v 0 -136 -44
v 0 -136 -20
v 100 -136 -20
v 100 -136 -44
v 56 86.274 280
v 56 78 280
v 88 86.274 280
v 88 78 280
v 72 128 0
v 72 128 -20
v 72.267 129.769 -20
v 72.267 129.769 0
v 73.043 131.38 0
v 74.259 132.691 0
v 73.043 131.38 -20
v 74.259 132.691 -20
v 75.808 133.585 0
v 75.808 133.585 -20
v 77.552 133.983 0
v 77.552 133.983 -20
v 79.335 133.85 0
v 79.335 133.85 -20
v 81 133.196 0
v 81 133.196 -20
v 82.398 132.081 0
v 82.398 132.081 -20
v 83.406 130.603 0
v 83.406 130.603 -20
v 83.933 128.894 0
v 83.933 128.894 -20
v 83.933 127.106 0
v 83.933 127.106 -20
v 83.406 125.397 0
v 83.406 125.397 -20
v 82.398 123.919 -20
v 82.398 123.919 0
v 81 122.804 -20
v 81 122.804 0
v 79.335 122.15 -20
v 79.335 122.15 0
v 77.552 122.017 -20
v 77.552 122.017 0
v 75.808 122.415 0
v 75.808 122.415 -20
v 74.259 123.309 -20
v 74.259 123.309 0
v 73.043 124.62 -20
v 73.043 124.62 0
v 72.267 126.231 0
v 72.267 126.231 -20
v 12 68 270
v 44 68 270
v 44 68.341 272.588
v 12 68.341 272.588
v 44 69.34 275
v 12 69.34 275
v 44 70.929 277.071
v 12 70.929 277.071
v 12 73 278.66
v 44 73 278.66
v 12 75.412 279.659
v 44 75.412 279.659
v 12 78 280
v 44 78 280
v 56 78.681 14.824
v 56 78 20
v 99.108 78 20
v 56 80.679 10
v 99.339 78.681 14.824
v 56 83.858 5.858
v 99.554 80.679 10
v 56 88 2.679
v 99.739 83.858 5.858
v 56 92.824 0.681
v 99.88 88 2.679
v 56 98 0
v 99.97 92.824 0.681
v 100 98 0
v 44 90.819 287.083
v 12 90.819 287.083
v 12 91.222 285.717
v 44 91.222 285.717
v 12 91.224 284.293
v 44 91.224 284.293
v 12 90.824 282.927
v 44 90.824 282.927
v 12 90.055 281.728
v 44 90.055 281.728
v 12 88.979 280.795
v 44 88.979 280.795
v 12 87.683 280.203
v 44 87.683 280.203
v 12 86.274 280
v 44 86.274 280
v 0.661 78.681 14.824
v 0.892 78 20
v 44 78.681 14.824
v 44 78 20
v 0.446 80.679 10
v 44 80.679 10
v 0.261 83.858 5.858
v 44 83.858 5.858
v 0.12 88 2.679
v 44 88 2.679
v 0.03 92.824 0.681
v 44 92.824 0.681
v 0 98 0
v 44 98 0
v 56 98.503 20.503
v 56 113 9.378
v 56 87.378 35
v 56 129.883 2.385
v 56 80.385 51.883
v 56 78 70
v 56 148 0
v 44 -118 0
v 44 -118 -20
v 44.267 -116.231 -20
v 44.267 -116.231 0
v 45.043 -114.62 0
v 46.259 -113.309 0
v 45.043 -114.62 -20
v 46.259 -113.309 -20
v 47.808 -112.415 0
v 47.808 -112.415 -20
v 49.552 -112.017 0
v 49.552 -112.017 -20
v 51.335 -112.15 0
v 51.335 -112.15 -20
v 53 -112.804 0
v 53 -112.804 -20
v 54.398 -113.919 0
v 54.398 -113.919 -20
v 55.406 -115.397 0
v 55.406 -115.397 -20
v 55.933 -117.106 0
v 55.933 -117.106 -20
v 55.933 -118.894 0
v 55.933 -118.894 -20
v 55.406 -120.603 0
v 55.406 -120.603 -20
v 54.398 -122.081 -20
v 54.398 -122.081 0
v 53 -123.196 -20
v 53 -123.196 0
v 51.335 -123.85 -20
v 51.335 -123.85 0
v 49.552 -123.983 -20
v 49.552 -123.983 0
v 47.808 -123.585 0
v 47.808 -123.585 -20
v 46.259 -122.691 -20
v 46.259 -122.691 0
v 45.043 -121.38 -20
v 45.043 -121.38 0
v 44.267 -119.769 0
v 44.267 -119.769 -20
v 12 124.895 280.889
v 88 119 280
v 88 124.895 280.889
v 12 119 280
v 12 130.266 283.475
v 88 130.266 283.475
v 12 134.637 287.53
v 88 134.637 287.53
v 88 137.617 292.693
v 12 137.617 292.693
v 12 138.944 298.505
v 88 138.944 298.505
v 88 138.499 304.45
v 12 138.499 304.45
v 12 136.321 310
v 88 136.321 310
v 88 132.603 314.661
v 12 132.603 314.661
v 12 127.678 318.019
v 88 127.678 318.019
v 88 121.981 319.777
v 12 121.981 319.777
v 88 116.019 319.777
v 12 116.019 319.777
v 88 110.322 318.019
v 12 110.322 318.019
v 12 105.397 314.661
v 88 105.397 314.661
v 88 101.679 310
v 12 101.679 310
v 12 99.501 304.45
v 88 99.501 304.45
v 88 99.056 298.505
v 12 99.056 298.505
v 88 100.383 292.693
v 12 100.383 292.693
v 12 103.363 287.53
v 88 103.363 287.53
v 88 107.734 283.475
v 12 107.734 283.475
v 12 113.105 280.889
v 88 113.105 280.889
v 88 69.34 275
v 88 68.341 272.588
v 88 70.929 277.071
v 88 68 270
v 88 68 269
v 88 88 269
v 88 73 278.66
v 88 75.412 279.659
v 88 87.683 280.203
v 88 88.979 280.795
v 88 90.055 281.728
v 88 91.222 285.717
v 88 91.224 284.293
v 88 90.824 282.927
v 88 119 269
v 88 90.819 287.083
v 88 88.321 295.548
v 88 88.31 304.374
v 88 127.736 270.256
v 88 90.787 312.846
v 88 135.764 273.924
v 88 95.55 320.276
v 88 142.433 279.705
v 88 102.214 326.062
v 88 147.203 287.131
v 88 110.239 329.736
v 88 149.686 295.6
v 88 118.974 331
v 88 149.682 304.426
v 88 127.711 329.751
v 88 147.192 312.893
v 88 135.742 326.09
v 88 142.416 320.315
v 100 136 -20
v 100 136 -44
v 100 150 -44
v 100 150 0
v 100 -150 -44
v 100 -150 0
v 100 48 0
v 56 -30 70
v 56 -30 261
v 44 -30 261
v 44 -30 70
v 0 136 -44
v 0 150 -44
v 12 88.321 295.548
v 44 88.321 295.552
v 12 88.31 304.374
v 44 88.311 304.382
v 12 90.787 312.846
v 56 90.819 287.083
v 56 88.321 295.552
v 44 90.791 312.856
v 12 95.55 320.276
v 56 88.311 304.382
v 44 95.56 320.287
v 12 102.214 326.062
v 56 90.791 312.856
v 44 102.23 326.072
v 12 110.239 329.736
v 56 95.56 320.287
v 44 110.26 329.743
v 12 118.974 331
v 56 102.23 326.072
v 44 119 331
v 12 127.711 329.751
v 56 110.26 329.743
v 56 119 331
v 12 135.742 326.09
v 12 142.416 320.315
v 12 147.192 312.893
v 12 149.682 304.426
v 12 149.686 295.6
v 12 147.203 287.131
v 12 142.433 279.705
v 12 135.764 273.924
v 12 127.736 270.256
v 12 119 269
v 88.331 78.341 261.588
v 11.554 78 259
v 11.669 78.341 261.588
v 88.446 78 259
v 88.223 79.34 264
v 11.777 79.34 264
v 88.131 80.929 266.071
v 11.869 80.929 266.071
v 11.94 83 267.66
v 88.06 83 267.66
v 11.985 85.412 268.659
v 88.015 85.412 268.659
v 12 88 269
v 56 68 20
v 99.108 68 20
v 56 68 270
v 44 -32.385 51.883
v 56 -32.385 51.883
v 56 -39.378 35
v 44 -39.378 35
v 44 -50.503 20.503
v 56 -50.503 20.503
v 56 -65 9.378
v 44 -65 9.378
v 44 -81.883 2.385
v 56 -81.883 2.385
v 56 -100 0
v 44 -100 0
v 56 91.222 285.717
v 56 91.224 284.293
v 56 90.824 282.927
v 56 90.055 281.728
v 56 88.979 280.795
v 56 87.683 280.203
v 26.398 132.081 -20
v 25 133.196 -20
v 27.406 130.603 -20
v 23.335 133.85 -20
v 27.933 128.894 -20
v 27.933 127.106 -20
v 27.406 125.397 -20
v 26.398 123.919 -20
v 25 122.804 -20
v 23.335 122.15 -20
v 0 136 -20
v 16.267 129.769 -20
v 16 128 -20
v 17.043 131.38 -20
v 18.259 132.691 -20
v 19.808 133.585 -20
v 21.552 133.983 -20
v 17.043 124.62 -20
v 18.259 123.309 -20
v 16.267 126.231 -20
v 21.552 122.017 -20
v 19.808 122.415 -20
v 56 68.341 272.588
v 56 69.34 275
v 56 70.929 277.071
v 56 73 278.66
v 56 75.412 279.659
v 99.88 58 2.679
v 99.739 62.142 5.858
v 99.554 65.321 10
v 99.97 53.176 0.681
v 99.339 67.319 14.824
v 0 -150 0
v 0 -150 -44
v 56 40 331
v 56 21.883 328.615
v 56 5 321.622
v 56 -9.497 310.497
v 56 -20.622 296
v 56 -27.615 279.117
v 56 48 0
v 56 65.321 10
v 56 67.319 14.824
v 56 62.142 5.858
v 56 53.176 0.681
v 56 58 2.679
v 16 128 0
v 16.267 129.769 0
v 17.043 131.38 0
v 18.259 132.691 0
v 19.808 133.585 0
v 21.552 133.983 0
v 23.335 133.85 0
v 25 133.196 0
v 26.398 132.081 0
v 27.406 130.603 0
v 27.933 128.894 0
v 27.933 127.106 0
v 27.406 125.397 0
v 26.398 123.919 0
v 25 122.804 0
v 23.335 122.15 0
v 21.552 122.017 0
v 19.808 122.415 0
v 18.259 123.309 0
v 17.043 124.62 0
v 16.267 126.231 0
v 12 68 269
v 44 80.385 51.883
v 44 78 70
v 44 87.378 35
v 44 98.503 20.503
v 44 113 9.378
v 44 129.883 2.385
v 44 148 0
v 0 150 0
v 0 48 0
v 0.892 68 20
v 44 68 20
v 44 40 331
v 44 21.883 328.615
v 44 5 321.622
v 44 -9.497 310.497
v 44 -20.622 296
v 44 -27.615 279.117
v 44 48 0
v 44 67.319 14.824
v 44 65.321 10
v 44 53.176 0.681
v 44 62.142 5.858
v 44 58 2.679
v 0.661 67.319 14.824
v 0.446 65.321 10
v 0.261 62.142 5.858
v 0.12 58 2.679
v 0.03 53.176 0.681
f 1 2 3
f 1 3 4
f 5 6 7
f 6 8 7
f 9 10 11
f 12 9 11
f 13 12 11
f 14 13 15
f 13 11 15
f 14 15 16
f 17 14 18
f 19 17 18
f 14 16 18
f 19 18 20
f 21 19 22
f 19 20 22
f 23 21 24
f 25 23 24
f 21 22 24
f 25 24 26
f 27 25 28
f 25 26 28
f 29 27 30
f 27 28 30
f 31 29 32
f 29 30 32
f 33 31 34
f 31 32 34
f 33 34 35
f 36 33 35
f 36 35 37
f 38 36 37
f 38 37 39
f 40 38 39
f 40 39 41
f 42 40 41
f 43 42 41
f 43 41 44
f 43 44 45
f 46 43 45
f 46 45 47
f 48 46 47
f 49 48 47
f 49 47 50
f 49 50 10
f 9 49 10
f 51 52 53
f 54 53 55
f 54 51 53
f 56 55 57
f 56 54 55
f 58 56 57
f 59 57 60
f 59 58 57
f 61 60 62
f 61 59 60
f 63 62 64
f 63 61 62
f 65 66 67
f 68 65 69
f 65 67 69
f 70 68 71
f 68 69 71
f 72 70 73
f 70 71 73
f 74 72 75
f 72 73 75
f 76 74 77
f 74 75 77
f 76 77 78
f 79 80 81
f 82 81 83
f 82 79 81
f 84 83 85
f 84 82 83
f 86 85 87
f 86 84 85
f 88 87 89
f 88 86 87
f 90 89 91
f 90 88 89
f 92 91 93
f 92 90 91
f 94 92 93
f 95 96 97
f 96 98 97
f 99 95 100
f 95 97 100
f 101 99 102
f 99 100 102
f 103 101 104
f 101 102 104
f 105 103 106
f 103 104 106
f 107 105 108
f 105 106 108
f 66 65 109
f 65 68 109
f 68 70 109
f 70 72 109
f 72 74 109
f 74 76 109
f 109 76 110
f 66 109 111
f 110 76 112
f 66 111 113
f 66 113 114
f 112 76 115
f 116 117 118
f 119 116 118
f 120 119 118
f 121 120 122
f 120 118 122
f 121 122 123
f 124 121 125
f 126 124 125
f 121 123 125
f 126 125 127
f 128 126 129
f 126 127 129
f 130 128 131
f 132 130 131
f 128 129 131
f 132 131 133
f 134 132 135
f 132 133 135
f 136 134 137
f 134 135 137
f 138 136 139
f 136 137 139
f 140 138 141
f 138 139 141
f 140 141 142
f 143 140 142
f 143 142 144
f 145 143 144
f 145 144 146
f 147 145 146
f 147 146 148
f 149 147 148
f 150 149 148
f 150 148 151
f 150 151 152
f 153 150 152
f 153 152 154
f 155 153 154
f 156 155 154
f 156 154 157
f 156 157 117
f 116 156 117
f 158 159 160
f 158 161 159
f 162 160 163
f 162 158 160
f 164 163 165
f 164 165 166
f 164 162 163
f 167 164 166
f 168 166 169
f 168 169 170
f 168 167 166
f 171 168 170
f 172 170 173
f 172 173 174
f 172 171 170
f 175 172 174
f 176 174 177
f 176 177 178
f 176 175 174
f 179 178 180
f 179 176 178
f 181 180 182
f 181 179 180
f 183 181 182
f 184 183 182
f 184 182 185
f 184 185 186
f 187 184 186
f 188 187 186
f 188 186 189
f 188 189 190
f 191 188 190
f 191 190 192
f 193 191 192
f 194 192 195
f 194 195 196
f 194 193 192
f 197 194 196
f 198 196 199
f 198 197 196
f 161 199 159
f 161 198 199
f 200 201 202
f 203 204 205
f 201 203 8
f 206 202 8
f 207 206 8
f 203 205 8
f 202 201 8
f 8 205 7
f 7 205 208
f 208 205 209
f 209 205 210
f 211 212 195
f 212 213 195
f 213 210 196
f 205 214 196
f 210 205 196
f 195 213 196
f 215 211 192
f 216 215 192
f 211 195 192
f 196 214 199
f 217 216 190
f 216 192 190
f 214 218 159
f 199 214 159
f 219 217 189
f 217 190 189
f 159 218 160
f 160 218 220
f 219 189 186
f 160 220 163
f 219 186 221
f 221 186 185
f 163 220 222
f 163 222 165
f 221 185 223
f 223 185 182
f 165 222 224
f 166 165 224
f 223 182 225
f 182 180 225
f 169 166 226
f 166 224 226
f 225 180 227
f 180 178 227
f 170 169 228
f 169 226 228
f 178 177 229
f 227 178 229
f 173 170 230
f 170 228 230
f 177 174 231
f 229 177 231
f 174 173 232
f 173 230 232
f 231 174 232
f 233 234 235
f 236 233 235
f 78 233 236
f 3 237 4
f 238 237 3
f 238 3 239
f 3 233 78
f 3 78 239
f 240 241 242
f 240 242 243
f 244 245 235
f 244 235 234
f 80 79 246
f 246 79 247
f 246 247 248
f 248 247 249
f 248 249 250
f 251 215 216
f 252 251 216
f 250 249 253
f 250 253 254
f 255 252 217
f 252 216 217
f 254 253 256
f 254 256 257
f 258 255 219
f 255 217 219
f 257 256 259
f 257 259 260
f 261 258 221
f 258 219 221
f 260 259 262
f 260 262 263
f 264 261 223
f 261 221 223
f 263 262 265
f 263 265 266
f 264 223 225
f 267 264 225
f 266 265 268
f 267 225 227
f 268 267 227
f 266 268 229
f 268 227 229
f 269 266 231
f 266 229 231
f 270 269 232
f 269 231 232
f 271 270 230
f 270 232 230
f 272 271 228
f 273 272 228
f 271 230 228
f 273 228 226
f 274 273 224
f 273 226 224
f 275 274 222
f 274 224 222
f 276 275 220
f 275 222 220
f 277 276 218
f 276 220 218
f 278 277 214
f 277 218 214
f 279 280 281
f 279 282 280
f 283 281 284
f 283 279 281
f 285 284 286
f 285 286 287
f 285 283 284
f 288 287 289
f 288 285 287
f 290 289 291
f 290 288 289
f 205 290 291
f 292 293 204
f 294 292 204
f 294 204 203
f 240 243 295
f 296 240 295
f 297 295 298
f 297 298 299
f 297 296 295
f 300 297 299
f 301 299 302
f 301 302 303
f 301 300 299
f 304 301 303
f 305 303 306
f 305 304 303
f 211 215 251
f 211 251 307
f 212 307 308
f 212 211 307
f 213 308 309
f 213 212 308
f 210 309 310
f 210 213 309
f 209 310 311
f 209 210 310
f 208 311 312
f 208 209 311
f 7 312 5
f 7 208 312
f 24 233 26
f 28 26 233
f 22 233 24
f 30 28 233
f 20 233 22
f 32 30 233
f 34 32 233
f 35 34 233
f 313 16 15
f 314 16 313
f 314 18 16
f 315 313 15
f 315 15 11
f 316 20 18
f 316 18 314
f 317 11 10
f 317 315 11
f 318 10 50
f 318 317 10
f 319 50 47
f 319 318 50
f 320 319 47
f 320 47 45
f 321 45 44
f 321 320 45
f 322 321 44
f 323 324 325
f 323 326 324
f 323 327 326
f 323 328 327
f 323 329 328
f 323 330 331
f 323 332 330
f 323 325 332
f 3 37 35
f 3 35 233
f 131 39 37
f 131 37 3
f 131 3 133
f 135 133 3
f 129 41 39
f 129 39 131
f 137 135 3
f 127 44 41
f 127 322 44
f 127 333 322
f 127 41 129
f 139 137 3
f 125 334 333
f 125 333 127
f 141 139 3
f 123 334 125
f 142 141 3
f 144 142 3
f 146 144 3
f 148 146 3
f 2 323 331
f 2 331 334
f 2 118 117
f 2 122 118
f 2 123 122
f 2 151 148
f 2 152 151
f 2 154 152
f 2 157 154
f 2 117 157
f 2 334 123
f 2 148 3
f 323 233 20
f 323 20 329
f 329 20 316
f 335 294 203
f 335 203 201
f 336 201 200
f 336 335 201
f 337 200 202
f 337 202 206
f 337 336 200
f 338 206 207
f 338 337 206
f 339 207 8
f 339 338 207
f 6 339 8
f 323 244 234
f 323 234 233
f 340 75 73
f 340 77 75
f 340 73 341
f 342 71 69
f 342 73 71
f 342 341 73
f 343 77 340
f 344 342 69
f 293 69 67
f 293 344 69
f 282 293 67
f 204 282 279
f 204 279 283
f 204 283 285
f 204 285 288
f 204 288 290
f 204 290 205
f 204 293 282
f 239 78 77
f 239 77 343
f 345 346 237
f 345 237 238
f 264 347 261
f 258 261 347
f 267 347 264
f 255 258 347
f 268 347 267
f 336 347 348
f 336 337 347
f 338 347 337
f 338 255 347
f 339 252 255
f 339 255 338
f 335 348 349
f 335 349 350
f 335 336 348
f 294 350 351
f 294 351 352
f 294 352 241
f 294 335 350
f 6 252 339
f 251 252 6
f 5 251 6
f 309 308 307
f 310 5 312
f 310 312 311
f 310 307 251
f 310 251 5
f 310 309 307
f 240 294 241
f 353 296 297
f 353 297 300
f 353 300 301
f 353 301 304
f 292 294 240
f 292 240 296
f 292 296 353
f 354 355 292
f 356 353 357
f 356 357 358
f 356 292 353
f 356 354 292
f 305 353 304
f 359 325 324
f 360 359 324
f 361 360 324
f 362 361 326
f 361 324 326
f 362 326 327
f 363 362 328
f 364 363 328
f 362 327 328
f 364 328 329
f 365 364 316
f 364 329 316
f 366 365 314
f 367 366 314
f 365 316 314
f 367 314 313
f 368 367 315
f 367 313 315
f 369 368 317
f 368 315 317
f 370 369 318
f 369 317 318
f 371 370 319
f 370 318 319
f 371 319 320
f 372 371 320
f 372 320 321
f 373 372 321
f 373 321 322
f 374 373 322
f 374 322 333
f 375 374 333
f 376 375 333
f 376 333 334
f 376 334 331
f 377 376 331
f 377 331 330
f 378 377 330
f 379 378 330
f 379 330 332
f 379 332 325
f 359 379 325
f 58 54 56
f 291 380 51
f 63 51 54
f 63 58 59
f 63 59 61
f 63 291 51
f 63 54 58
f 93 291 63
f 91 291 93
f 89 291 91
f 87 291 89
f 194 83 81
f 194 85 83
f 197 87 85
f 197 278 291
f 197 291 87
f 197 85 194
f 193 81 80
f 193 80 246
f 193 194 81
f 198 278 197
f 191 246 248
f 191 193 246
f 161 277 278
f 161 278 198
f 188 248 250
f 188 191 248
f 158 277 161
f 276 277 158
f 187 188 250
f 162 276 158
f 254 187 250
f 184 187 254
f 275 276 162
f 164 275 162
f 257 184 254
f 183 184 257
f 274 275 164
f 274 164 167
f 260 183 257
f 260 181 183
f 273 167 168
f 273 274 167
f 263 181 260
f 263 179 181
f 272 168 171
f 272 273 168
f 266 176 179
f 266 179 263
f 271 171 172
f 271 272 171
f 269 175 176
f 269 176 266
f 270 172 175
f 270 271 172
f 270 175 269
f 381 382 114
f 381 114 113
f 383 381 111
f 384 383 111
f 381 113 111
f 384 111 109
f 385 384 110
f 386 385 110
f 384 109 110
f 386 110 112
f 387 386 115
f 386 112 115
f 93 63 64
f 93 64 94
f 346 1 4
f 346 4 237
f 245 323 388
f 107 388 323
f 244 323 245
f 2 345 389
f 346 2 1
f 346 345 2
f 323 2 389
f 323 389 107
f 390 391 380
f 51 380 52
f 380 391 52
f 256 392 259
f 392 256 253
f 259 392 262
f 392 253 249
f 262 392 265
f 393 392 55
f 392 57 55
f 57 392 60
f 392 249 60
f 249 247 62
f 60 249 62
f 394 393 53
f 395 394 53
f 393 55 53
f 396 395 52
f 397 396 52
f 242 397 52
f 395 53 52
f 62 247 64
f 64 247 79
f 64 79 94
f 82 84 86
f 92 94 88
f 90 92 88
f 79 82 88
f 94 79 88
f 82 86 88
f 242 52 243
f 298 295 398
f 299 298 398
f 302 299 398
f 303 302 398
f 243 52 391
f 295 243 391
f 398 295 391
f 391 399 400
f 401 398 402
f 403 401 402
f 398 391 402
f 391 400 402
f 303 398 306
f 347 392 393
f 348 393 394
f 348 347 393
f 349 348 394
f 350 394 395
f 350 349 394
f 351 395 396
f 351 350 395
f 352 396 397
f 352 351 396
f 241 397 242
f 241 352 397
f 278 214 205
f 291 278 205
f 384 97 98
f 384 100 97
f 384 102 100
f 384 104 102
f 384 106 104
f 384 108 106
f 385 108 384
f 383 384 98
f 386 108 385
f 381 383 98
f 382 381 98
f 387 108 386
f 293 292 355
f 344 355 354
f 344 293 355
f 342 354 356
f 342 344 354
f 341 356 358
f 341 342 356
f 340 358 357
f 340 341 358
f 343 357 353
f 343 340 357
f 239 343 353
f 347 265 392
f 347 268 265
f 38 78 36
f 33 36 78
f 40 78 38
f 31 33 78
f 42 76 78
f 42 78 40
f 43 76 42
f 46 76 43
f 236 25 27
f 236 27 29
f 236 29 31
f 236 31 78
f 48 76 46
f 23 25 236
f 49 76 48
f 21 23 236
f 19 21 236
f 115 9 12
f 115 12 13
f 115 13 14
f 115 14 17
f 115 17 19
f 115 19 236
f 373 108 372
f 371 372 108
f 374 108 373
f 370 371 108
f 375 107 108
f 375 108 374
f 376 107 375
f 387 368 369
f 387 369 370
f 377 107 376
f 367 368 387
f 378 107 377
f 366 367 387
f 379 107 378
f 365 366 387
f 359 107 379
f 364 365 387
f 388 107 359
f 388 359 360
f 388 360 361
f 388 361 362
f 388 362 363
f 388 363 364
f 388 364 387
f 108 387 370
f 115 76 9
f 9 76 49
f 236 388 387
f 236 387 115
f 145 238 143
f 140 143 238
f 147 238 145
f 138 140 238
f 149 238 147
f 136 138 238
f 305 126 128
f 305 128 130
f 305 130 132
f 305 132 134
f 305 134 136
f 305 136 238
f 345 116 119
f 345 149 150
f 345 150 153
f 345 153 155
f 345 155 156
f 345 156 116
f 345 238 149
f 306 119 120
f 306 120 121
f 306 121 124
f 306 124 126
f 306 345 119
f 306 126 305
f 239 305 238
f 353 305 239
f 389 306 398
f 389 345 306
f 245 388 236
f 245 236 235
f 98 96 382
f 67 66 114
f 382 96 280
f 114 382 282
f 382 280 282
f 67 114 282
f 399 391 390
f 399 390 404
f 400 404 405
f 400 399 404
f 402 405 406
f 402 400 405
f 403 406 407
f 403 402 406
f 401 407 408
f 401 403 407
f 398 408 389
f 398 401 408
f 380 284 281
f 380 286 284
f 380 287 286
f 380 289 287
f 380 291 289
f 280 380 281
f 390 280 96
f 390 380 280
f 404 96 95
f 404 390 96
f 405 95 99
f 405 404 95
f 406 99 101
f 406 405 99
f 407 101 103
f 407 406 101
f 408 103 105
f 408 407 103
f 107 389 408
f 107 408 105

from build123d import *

# Parameters (mm, degrees)
BOSS_EXTRUDE1_DEPTH = 100
SKETCH4_R           = 20
BOSS_EXTRUDE3_DEPTH = 38
BOSS_EXTRUDE4_DEPTH = 10
FILLET1_R           = 10
FILLET2_R           = 5
BOSS_EXTRUDE5_DEPTH = 6
FILLET3_R           = 20
BOSS_EXTRUDE6_DEPTH = 6
HOLE1_D             = 12
HOLE1_DEPTH         = 44


with BuildPart() as part:
    # Sketch1 → Boss-Extrude1 (new body)
    with BuildSketch(Plane(origin=(0, 0, 0), x_dir=(0, 0, -1), z_dir=(1, 0, 0))):
        Polygon((20, -136), (44, -136), (44, -150), (0, -150), (0, 150), (44, 150), (44, 136), (20, 136), align=None)
    extrude(amount=BOSS_EXTRUDE1_DEPTH)



with BuildPart() as body_2:
    # Sketch4 → Boss-Extrude3 (new, symmetric)
    with BuildSketch(Plane(origin=(50, 0, 0), x_dir=(0, 0, -1), z_dir=(1, 0, 0))):
        with BuildLine():
            Line((-269, 119), (-269, 68))
            Line((-269, 68), (-280, 68))
            Line((-280, 68), (-280, 95.314561435))
            ThreePointArc((-280, 95.314561435), (-328.115831839, 132.057564857), (-269, 119))
        make_face()
        with Locations((-300, 119)):
            Circle(SKETCH4_R, mode=Mode.SUBTRACT)
    extrude(amount=BOSS_EXTRUDE3_DEPTH, both=True)


with BuildPart() as part_1:
    add(part.part)

    add(body_2.part)  # Boss-Extrude4 merges body 2
    # Sketch7 → Boss-Extrude4 (add)
    with BuildSketch(Plane.XZ.offset(-68)):
        Polygon((88, 280), (12, 280), (12, 269), (0, 0), (0, -5), (100, -5), (100, 0), (88, 269), align=None)
    extrude(amount=-BOSS_EXTRUDE4_DEPTH)

    # Fillet1
    fillet1_edges = [part_1.edges().sort_by_distance(p)[0] for p in [
        (50, 68, 280),
        (50, 78, 269),
    ]]
    fillet(fillet1_edges, radius=FILLET1_R)

    # Fillet2
    fillet2_edges = [part_1.edges().sort_by_distance(p)[0] for p in [
        (50, 95.314561435, 280),
    ]]
    fillet(fillet2_edges, radius=FILLET2_R)

    # Sketch8 → Boss-Extrude5 (add, symmetric)
    with BuildSketch(Plane(origin=(50, 0, 0), x_dir=(0, 0, -1), z_dir=(1, 0, 0))):
        with BuildLine():
            Line((0, 78), (-70, 78))
            ThreePointArc((-70, 78), (-20.502525317, 98.502525317), (0, 148))
            Line((0, 148), (0, 78))
        make_face()
    extrude(amount=BOSS_EXTRUDE5_DEPTH, both=True)

    # Fillet3
    fillet3_edges = [part_1.edges().sort_by_distance(p)[0] for p in [
        (78, 78, 0),
        (50, 68, 0),
        (22, 78, 0),
    ]]
    fillet(fillet3_edges, radius=FILLET3_R)

    # Sketch10 → Boss-Extrude6 (add, symmetric)
    with BuildSketch(Plane(origin=(50, 0, 0), x_dir=(0, 0, -1), z_dir=(1, 0, 0))):
        with BuildLine():
            Line((-331, 119), (-331, 40))
            ThreePointArc((-331, 40), (-310.497474683, -9.497474683), (-261, -30))
            Line((-261, -30), (-70, -30))
            ThreePointArc((-70, -30), (-20.502525317, -50.502525317), (0, -100))
            Line((0, -100), (0, 48))
            ThreePointArc((0, 48), (-5.857864376, 62.142135624), (-20, 68))
            Line((-20, 68), (-269, 68))
            Line((-269, 68), (-270, 68))
            ThreePointArc((-270, 68), (-277.071067812, 70.928932188), (-280, 78))
            Line((-280, 78), (-280, 86.273863656))
            ThreePointArc((-280, 86.273863656), (-282.299691376, 90.481990714), (-287.083333333, 90.819160371))
            ThreePointArc((-287.083333333, 90.819160371), (-316.741913471, 92.909612243), (-331, 119))
        make_face()
    extrude(amount=BOSS_EXTRUDE6_DEPTH, both=True)

    # Hole1
    with Locations(Plane.XY):
        with Locations((50, -118), (22, 128), (78, 128)):
            Hole(HOLE1_D / 2, depth=HOLE1_DEPTH)


solid = part_1.part
